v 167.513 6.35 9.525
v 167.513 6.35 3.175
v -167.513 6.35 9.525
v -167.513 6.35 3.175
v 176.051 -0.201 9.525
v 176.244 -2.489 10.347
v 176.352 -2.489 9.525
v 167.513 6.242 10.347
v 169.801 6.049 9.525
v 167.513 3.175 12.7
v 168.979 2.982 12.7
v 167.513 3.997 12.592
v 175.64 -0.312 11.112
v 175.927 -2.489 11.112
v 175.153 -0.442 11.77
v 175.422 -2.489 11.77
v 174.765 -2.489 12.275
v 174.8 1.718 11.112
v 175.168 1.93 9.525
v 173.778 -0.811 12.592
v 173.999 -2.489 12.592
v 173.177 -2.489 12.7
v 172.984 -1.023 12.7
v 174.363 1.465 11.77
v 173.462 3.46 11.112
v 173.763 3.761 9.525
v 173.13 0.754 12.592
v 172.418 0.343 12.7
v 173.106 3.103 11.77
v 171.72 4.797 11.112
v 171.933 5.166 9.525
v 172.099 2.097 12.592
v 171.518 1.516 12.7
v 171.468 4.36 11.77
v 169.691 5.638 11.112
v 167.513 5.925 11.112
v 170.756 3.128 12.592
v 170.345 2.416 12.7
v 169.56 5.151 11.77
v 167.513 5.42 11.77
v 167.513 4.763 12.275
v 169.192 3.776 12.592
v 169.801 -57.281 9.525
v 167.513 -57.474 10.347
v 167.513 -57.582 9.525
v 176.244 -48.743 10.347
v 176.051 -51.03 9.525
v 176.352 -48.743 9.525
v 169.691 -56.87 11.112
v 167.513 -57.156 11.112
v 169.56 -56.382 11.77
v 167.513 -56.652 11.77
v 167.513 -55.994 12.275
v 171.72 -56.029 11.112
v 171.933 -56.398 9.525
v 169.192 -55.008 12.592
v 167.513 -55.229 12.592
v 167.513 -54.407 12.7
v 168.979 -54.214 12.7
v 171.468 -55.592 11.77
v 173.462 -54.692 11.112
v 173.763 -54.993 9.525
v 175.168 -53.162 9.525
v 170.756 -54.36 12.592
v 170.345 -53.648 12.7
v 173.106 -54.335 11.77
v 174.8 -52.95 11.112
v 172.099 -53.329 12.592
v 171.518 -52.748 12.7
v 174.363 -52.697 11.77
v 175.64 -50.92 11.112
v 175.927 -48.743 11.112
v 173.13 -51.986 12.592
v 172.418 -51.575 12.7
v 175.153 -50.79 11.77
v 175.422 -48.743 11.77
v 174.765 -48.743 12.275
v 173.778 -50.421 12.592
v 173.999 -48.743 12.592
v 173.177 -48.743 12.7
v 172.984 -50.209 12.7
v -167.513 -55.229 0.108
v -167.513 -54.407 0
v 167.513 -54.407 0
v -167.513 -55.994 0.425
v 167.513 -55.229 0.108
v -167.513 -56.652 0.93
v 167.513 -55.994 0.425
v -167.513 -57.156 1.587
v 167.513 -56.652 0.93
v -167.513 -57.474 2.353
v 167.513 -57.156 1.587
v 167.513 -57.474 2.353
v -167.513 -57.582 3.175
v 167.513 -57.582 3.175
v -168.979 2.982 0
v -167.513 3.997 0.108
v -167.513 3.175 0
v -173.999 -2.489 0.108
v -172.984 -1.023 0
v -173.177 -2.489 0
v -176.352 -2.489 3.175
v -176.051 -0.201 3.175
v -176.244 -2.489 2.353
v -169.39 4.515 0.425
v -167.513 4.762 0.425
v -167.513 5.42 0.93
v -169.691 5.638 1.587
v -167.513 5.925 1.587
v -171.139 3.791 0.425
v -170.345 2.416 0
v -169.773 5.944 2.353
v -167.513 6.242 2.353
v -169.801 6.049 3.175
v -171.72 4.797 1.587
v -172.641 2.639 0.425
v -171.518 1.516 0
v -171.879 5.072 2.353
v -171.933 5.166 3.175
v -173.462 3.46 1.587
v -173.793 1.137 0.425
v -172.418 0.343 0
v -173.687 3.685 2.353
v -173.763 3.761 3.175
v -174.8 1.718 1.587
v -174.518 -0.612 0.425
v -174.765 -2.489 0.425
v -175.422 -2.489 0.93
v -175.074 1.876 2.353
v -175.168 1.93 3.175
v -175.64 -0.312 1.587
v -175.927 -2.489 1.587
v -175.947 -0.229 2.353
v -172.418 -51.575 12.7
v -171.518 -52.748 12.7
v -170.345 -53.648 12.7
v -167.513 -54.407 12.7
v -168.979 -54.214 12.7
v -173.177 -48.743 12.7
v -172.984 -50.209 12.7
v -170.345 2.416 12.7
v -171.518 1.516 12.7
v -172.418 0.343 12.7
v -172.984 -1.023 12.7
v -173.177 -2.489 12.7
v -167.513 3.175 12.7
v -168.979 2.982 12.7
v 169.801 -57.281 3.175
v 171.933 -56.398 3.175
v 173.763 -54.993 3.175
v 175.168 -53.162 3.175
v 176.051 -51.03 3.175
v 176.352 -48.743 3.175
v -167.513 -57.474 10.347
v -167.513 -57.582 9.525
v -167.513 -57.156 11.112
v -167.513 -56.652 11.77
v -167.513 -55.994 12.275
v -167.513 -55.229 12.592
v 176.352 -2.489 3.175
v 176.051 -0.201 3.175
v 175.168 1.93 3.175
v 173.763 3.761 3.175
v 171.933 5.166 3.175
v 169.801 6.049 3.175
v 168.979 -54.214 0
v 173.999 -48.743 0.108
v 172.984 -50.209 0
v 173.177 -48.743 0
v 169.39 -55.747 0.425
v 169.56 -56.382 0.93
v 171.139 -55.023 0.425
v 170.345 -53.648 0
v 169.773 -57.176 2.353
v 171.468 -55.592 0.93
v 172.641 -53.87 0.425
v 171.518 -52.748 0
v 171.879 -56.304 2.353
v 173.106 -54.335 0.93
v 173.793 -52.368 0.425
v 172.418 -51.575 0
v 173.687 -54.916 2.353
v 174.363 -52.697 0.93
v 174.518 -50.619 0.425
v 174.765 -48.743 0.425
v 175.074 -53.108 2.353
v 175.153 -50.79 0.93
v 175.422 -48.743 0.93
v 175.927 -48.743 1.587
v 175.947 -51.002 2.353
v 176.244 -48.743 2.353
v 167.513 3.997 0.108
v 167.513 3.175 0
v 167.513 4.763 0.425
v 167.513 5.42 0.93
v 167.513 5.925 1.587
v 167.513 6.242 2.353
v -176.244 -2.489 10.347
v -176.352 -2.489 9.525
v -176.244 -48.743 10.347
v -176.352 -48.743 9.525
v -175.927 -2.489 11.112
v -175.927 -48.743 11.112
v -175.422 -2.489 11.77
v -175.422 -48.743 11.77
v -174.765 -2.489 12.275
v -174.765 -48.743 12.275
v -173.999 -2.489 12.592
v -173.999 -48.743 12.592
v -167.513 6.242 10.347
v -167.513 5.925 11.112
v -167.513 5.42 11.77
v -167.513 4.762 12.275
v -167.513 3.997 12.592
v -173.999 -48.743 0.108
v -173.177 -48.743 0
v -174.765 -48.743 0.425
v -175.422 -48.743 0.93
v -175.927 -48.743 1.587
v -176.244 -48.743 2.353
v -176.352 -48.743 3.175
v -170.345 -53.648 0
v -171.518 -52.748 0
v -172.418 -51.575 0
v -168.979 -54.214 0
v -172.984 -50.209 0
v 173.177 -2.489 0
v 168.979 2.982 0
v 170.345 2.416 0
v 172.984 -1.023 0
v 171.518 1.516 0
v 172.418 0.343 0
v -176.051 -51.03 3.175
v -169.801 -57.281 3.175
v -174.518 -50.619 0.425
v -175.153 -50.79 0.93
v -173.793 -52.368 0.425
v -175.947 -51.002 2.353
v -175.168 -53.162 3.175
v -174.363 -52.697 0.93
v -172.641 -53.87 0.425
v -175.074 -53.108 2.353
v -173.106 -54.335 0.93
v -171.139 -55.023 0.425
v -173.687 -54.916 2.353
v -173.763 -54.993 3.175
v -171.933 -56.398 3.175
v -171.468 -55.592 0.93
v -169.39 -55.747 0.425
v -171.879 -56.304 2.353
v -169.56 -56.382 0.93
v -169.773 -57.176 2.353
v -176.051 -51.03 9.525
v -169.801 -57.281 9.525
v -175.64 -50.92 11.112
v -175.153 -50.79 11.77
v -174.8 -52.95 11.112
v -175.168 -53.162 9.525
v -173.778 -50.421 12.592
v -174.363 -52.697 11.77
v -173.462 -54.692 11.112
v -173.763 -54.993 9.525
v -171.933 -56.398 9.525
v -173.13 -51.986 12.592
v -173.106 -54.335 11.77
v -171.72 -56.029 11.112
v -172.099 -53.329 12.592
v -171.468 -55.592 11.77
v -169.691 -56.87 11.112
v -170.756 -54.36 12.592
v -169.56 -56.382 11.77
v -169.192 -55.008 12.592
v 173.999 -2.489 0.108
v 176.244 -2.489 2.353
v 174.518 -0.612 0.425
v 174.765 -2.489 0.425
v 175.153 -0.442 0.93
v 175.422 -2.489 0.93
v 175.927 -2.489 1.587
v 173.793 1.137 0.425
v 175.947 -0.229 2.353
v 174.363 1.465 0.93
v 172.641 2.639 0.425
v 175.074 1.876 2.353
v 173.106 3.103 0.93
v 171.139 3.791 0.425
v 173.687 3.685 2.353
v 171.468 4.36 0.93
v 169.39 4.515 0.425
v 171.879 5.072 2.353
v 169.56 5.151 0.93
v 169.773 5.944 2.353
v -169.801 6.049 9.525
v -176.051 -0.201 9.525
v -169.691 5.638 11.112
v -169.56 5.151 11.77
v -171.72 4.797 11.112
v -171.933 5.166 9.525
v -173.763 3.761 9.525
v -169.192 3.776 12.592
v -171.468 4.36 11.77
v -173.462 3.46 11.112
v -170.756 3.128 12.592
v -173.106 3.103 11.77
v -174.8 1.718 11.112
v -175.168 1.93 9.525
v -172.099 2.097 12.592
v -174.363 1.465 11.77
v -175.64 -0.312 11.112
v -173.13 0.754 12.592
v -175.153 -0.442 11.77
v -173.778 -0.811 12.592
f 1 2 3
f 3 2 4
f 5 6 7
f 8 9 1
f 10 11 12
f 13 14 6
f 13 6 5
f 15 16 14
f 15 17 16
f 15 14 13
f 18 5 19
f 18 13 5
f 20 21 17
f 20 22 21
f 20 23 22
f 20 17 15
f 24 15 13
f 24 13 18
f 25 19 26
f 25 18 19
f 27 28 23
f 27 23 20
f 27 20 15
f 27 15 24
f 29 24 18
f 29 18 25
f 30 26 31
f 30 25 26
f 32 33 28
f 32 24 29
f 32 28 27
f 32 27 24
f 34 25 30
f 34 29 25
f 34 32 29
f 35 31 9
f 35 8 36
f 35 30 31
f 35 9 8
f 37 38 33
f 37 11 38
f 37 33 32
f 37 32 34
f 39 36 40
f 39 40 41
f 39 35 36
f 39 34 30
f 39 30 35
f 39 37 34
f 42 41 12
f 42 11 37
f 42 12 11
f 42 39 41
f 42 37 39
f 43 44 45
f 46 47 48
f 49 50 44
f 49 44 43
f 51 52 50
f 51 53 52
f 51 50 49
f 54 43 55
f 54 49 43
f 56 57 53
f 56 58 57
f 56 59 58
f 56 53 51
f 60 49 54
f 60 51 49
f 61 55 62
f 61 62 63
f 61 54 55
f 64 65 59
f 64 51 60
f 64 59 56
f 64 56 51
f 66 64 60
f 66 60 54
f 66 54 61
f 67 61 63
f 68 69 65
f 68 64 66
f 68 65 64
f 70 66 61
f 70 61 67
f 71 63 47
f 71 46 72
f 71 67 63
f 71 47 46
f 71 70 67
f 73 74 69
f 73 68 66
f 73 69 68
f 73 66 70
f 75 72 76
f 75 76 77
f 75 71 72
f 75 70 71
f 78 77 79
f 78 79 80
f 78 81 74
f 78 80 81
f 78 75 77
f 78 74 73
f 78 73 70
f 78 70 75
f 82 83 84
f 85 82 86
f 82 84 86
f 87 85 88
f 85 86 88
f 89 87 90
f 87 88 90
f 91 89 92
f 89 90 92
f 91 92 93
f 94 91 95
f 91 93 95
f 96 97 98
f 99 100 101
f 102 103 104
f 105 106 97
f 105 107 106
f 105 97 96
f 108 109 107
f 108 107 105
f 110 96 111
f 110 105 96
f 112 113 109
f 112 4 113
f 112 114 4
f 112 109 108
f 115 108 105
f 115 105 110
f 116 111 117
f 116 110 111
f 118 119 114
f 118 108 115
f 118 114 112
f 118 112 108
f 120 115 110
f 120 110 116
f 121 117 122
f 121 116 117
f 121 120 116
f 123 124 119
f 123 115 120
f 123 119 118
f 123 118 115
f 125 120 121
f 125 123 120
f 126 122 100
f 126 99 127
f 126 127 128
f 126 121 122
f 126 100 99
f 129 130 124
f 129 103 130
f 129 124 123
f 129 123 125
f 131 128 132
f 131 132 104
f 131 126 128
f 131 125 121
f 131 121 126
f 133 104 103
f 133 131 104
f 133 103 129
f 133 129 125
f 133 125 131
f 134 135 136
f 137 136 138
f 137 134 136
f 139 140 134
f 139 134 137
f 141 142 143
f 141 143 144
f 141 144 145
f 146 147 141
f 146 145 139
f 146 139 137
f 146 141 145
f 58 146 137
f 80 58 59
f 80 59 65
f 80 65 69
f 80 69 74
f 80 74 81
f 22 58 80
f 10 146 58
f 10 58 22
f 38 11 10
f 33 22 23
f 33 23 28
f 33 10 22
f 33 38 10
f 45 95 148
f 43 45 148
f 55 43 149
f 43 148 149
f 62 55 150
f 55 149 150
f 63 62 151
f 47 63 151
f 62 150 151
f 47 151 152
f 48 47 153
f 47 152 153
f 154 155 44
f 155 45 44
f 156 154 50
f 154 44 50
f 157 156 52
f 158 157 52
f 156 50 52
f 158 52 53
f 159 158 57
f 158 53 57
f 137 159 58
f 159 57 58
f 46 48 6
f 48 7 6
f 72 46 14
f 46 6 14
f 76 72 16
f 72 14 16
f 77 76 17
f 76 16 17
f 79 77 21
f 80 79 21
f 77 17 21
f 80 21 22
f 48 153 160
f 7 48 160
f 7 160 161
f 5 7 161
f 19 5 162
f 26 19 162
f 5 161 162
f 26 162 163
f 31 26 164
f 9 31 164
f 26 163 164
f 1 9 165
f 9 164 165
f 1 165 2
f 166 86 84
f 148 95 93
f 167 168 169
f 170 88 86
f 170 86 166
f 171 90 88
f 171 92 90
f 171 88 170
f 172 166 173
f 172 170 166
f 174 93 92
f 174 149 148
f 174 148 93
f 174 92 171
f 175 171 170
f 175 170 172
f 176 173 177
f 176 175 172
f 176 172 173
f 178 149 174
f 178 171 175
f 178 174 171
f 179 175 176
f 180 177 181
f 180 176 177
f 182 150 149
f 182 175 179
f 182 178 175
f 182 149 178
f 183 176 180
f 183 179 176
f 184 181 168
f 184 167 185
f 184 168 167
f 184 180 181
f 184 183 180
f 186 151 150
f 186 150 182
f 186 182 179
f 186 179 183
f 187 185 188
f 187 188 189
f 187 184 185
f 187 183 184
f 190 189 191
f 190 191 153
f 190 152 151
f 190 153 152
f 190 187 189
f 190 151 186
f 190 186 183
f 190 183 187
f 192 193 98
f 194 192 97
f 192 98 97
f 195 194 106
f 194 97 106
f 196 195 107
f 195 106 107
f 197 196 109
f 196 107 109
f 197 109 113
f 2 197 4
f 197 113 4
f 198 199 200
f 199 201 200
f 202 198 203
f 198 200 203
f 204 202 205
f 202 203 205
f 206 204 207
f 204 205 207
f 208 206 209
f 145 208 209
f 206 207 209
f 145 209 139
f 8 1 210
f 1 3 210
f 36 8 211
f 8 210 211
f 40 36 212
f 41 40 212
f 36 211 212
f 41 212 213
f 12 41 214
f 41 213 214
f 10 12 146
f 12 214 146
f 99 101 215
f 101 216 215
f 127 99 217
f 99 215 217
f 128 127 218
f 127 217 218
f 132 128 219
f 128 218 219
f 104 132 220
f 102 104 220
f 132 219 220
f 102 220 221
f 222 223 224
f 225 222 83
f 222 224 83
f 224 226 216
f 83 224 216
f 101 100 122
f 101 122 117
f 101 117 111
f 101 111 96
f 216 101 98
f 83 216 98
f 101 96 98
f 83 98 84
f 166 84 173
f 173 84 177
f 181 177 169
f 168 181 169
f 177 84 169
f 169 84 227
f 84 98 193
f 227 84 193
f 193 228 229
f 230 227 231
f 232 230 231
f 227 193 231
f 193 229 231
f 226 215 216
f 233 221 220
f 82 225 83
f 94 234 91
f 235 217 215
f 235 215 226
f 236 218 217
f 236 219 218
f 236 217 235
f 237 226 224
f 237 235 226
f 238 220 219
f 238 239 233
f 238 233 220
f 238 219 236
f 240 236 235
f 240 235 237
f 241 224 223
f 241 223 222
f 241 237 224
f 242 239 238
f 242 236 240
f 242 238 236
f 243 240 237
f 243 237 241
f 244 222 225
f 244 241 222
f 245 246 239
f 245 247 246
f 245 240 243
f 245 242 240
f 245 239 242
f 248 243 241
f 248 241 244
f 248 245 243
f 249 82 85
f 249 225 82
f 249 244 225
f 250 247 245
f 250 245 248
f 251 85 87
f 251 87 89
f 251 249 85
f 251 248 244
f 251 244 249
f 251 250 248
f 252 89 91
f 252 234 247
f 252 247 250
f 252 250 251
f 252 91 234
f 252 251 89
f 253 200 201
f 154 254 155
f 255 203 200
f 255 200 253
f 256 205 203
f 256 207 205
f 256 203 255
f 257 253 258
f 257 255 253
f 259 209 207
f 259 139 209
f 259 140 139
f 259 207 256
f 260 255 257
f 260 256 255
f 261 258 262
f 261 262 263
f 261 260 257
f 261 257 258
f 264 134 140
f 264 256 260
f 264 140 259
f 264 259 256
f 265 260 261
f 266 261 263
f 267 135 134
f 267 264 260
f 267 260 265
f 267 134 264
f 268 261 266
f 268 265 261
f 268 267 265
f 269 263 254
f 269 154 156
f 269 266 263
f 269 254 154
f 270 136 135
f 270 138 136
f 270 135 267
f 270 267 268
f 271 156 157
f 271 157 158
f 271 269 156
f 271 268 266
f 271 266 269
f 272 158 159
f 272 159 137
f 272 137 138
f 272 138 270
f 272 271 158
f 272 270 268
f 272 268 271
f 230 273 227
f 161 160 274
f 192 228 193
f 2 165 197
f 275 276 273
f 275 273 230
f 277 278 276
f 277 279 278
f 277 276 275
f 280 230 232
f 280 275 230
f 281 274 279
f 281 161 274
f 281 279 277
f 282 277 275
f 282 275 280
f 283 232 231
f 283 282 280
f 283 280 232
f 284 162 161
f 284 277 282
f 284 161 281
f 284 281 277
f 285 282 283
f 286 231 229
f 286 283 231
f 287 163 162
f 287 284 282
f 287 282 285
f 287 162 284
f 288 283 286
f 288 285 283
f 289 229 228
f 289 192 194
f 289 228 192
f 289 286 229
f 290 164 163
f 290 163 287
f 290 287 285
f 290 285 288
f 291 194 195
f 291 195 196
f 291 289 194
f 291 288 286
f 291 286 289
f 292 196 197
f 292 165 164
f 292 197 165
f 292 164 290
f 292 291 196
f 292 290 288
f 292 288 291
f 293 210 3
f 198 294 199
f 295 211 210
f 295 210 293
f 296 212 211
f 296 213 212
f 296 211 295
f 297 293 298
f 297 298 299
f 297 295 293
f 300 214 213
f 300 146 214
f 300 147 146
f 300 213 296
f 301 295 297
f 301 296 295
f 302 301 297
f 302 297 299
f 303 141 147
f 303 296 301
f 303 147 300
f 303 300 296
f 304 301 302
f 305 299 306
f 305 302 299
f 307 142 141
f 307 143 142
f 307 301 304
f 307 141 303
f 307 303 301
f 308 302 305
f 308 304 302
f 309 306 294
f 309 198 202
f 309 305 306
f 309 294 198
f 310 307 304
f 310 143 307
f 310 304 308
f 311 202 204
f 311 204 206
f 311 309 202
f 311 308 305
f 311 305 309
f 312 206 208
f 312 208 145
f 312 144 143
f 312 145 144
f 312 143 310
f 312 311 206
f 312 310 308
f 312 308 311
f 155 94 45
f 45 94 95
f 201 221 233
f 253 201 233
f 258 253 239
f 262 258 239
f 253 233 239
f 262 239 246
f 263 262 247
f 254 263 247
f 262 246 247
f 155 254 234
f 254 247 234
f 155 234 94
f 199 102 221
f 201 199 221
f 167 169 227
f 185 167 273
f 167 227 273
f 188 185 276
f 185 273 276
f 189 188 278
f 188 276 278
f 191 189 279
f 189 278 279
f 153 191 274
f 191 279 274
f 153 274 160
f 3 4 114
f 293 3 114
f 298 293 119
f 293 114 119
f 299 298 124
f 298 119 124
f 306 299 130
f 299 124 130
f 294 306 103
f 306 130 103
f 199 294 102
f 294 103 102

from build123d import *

# Parameters (mm, degrees)
BOSS_EXTRUDE1_DEPTH = 12.7
FILLET1_R           = 3.175
FILLET2_R           = 3.175


with BuildPart() as part:
    # Sketch1 → Boss-Extrude1 (new body)
    with BuildSketch(Plane.XY):
        with BuildLine():
            Line((-157.3022, -57.5818), (157.3022, -57.5818))
            Line((157.3022, -57.5818), (167.513, -57.5818))
            ThreePointArc((167.513, -57.5818), (173.76325826, -54.99285826), (176.3522, -48.7426))
            Line((176.3522, -48.7426), (176.3522, -2.4892))
            ThreePointArc((176.3522, -2.4892), (173.76325826, 3.76105826), (167.513, 6.35))
            Line((167.513, 6.35), (-167.513, 6.35))
            ThreePointArc((-167.513, 6.35), (-173.76325826, 3.76105826), (-176.3522, -2.4892))
            Line((-176.3522, -2.4892), (-176.3522, -48.7426))
            ThreePointArc((-176.3522, -48.7426), (-173.76325826, -54.99285826), (-167.513, -57.5818))
            Line((-167.513, -57.5818), (-157.3022, -57.5818))
        make_face()
    extrude(amount=BOSS_EXTRUDE1_DEPTH)

    # Fillet1
    fillet1_edges = [part.edges().sort_by_distance(p)[0] for p in [
        (173.76325826, -54.99285826, 12.7),
        (176.3522, -25.6159, 12.7),
        (173.76325826, 3.76105826, 12.7),
        (0, 6.35, 12.7),
        (-173.76325826, 3.76105826, 12.7),
        (-176.3522, -25.6159, 12.7),
        (-173.76325826, -54.99285826, 12.7),
        (0, -57.5818, 12.7),
    ]]
    fillet(fillet1_edges, radius=FILLET1_R)

    # Fillet2
    fillet2_edges = [part.edges().sort_by_distance(p)[0] for p in [
        (-176.3522, -25.6159, 0),
        (-173.76325826, 3.76105826, 0),
        (0, 6.35, 0),
        (173.76325826, 3.76105826, 0),
        (176.3522, -25.6159, 0),
        (173.76325826, -54.99285826, 0),
        (0, -57.5818, 0),
        (-173.76325826, -54.99285826, 0),
    ]]
    fillet(fillet2_edges, radius=FILLET2_R)


solid = part.part
